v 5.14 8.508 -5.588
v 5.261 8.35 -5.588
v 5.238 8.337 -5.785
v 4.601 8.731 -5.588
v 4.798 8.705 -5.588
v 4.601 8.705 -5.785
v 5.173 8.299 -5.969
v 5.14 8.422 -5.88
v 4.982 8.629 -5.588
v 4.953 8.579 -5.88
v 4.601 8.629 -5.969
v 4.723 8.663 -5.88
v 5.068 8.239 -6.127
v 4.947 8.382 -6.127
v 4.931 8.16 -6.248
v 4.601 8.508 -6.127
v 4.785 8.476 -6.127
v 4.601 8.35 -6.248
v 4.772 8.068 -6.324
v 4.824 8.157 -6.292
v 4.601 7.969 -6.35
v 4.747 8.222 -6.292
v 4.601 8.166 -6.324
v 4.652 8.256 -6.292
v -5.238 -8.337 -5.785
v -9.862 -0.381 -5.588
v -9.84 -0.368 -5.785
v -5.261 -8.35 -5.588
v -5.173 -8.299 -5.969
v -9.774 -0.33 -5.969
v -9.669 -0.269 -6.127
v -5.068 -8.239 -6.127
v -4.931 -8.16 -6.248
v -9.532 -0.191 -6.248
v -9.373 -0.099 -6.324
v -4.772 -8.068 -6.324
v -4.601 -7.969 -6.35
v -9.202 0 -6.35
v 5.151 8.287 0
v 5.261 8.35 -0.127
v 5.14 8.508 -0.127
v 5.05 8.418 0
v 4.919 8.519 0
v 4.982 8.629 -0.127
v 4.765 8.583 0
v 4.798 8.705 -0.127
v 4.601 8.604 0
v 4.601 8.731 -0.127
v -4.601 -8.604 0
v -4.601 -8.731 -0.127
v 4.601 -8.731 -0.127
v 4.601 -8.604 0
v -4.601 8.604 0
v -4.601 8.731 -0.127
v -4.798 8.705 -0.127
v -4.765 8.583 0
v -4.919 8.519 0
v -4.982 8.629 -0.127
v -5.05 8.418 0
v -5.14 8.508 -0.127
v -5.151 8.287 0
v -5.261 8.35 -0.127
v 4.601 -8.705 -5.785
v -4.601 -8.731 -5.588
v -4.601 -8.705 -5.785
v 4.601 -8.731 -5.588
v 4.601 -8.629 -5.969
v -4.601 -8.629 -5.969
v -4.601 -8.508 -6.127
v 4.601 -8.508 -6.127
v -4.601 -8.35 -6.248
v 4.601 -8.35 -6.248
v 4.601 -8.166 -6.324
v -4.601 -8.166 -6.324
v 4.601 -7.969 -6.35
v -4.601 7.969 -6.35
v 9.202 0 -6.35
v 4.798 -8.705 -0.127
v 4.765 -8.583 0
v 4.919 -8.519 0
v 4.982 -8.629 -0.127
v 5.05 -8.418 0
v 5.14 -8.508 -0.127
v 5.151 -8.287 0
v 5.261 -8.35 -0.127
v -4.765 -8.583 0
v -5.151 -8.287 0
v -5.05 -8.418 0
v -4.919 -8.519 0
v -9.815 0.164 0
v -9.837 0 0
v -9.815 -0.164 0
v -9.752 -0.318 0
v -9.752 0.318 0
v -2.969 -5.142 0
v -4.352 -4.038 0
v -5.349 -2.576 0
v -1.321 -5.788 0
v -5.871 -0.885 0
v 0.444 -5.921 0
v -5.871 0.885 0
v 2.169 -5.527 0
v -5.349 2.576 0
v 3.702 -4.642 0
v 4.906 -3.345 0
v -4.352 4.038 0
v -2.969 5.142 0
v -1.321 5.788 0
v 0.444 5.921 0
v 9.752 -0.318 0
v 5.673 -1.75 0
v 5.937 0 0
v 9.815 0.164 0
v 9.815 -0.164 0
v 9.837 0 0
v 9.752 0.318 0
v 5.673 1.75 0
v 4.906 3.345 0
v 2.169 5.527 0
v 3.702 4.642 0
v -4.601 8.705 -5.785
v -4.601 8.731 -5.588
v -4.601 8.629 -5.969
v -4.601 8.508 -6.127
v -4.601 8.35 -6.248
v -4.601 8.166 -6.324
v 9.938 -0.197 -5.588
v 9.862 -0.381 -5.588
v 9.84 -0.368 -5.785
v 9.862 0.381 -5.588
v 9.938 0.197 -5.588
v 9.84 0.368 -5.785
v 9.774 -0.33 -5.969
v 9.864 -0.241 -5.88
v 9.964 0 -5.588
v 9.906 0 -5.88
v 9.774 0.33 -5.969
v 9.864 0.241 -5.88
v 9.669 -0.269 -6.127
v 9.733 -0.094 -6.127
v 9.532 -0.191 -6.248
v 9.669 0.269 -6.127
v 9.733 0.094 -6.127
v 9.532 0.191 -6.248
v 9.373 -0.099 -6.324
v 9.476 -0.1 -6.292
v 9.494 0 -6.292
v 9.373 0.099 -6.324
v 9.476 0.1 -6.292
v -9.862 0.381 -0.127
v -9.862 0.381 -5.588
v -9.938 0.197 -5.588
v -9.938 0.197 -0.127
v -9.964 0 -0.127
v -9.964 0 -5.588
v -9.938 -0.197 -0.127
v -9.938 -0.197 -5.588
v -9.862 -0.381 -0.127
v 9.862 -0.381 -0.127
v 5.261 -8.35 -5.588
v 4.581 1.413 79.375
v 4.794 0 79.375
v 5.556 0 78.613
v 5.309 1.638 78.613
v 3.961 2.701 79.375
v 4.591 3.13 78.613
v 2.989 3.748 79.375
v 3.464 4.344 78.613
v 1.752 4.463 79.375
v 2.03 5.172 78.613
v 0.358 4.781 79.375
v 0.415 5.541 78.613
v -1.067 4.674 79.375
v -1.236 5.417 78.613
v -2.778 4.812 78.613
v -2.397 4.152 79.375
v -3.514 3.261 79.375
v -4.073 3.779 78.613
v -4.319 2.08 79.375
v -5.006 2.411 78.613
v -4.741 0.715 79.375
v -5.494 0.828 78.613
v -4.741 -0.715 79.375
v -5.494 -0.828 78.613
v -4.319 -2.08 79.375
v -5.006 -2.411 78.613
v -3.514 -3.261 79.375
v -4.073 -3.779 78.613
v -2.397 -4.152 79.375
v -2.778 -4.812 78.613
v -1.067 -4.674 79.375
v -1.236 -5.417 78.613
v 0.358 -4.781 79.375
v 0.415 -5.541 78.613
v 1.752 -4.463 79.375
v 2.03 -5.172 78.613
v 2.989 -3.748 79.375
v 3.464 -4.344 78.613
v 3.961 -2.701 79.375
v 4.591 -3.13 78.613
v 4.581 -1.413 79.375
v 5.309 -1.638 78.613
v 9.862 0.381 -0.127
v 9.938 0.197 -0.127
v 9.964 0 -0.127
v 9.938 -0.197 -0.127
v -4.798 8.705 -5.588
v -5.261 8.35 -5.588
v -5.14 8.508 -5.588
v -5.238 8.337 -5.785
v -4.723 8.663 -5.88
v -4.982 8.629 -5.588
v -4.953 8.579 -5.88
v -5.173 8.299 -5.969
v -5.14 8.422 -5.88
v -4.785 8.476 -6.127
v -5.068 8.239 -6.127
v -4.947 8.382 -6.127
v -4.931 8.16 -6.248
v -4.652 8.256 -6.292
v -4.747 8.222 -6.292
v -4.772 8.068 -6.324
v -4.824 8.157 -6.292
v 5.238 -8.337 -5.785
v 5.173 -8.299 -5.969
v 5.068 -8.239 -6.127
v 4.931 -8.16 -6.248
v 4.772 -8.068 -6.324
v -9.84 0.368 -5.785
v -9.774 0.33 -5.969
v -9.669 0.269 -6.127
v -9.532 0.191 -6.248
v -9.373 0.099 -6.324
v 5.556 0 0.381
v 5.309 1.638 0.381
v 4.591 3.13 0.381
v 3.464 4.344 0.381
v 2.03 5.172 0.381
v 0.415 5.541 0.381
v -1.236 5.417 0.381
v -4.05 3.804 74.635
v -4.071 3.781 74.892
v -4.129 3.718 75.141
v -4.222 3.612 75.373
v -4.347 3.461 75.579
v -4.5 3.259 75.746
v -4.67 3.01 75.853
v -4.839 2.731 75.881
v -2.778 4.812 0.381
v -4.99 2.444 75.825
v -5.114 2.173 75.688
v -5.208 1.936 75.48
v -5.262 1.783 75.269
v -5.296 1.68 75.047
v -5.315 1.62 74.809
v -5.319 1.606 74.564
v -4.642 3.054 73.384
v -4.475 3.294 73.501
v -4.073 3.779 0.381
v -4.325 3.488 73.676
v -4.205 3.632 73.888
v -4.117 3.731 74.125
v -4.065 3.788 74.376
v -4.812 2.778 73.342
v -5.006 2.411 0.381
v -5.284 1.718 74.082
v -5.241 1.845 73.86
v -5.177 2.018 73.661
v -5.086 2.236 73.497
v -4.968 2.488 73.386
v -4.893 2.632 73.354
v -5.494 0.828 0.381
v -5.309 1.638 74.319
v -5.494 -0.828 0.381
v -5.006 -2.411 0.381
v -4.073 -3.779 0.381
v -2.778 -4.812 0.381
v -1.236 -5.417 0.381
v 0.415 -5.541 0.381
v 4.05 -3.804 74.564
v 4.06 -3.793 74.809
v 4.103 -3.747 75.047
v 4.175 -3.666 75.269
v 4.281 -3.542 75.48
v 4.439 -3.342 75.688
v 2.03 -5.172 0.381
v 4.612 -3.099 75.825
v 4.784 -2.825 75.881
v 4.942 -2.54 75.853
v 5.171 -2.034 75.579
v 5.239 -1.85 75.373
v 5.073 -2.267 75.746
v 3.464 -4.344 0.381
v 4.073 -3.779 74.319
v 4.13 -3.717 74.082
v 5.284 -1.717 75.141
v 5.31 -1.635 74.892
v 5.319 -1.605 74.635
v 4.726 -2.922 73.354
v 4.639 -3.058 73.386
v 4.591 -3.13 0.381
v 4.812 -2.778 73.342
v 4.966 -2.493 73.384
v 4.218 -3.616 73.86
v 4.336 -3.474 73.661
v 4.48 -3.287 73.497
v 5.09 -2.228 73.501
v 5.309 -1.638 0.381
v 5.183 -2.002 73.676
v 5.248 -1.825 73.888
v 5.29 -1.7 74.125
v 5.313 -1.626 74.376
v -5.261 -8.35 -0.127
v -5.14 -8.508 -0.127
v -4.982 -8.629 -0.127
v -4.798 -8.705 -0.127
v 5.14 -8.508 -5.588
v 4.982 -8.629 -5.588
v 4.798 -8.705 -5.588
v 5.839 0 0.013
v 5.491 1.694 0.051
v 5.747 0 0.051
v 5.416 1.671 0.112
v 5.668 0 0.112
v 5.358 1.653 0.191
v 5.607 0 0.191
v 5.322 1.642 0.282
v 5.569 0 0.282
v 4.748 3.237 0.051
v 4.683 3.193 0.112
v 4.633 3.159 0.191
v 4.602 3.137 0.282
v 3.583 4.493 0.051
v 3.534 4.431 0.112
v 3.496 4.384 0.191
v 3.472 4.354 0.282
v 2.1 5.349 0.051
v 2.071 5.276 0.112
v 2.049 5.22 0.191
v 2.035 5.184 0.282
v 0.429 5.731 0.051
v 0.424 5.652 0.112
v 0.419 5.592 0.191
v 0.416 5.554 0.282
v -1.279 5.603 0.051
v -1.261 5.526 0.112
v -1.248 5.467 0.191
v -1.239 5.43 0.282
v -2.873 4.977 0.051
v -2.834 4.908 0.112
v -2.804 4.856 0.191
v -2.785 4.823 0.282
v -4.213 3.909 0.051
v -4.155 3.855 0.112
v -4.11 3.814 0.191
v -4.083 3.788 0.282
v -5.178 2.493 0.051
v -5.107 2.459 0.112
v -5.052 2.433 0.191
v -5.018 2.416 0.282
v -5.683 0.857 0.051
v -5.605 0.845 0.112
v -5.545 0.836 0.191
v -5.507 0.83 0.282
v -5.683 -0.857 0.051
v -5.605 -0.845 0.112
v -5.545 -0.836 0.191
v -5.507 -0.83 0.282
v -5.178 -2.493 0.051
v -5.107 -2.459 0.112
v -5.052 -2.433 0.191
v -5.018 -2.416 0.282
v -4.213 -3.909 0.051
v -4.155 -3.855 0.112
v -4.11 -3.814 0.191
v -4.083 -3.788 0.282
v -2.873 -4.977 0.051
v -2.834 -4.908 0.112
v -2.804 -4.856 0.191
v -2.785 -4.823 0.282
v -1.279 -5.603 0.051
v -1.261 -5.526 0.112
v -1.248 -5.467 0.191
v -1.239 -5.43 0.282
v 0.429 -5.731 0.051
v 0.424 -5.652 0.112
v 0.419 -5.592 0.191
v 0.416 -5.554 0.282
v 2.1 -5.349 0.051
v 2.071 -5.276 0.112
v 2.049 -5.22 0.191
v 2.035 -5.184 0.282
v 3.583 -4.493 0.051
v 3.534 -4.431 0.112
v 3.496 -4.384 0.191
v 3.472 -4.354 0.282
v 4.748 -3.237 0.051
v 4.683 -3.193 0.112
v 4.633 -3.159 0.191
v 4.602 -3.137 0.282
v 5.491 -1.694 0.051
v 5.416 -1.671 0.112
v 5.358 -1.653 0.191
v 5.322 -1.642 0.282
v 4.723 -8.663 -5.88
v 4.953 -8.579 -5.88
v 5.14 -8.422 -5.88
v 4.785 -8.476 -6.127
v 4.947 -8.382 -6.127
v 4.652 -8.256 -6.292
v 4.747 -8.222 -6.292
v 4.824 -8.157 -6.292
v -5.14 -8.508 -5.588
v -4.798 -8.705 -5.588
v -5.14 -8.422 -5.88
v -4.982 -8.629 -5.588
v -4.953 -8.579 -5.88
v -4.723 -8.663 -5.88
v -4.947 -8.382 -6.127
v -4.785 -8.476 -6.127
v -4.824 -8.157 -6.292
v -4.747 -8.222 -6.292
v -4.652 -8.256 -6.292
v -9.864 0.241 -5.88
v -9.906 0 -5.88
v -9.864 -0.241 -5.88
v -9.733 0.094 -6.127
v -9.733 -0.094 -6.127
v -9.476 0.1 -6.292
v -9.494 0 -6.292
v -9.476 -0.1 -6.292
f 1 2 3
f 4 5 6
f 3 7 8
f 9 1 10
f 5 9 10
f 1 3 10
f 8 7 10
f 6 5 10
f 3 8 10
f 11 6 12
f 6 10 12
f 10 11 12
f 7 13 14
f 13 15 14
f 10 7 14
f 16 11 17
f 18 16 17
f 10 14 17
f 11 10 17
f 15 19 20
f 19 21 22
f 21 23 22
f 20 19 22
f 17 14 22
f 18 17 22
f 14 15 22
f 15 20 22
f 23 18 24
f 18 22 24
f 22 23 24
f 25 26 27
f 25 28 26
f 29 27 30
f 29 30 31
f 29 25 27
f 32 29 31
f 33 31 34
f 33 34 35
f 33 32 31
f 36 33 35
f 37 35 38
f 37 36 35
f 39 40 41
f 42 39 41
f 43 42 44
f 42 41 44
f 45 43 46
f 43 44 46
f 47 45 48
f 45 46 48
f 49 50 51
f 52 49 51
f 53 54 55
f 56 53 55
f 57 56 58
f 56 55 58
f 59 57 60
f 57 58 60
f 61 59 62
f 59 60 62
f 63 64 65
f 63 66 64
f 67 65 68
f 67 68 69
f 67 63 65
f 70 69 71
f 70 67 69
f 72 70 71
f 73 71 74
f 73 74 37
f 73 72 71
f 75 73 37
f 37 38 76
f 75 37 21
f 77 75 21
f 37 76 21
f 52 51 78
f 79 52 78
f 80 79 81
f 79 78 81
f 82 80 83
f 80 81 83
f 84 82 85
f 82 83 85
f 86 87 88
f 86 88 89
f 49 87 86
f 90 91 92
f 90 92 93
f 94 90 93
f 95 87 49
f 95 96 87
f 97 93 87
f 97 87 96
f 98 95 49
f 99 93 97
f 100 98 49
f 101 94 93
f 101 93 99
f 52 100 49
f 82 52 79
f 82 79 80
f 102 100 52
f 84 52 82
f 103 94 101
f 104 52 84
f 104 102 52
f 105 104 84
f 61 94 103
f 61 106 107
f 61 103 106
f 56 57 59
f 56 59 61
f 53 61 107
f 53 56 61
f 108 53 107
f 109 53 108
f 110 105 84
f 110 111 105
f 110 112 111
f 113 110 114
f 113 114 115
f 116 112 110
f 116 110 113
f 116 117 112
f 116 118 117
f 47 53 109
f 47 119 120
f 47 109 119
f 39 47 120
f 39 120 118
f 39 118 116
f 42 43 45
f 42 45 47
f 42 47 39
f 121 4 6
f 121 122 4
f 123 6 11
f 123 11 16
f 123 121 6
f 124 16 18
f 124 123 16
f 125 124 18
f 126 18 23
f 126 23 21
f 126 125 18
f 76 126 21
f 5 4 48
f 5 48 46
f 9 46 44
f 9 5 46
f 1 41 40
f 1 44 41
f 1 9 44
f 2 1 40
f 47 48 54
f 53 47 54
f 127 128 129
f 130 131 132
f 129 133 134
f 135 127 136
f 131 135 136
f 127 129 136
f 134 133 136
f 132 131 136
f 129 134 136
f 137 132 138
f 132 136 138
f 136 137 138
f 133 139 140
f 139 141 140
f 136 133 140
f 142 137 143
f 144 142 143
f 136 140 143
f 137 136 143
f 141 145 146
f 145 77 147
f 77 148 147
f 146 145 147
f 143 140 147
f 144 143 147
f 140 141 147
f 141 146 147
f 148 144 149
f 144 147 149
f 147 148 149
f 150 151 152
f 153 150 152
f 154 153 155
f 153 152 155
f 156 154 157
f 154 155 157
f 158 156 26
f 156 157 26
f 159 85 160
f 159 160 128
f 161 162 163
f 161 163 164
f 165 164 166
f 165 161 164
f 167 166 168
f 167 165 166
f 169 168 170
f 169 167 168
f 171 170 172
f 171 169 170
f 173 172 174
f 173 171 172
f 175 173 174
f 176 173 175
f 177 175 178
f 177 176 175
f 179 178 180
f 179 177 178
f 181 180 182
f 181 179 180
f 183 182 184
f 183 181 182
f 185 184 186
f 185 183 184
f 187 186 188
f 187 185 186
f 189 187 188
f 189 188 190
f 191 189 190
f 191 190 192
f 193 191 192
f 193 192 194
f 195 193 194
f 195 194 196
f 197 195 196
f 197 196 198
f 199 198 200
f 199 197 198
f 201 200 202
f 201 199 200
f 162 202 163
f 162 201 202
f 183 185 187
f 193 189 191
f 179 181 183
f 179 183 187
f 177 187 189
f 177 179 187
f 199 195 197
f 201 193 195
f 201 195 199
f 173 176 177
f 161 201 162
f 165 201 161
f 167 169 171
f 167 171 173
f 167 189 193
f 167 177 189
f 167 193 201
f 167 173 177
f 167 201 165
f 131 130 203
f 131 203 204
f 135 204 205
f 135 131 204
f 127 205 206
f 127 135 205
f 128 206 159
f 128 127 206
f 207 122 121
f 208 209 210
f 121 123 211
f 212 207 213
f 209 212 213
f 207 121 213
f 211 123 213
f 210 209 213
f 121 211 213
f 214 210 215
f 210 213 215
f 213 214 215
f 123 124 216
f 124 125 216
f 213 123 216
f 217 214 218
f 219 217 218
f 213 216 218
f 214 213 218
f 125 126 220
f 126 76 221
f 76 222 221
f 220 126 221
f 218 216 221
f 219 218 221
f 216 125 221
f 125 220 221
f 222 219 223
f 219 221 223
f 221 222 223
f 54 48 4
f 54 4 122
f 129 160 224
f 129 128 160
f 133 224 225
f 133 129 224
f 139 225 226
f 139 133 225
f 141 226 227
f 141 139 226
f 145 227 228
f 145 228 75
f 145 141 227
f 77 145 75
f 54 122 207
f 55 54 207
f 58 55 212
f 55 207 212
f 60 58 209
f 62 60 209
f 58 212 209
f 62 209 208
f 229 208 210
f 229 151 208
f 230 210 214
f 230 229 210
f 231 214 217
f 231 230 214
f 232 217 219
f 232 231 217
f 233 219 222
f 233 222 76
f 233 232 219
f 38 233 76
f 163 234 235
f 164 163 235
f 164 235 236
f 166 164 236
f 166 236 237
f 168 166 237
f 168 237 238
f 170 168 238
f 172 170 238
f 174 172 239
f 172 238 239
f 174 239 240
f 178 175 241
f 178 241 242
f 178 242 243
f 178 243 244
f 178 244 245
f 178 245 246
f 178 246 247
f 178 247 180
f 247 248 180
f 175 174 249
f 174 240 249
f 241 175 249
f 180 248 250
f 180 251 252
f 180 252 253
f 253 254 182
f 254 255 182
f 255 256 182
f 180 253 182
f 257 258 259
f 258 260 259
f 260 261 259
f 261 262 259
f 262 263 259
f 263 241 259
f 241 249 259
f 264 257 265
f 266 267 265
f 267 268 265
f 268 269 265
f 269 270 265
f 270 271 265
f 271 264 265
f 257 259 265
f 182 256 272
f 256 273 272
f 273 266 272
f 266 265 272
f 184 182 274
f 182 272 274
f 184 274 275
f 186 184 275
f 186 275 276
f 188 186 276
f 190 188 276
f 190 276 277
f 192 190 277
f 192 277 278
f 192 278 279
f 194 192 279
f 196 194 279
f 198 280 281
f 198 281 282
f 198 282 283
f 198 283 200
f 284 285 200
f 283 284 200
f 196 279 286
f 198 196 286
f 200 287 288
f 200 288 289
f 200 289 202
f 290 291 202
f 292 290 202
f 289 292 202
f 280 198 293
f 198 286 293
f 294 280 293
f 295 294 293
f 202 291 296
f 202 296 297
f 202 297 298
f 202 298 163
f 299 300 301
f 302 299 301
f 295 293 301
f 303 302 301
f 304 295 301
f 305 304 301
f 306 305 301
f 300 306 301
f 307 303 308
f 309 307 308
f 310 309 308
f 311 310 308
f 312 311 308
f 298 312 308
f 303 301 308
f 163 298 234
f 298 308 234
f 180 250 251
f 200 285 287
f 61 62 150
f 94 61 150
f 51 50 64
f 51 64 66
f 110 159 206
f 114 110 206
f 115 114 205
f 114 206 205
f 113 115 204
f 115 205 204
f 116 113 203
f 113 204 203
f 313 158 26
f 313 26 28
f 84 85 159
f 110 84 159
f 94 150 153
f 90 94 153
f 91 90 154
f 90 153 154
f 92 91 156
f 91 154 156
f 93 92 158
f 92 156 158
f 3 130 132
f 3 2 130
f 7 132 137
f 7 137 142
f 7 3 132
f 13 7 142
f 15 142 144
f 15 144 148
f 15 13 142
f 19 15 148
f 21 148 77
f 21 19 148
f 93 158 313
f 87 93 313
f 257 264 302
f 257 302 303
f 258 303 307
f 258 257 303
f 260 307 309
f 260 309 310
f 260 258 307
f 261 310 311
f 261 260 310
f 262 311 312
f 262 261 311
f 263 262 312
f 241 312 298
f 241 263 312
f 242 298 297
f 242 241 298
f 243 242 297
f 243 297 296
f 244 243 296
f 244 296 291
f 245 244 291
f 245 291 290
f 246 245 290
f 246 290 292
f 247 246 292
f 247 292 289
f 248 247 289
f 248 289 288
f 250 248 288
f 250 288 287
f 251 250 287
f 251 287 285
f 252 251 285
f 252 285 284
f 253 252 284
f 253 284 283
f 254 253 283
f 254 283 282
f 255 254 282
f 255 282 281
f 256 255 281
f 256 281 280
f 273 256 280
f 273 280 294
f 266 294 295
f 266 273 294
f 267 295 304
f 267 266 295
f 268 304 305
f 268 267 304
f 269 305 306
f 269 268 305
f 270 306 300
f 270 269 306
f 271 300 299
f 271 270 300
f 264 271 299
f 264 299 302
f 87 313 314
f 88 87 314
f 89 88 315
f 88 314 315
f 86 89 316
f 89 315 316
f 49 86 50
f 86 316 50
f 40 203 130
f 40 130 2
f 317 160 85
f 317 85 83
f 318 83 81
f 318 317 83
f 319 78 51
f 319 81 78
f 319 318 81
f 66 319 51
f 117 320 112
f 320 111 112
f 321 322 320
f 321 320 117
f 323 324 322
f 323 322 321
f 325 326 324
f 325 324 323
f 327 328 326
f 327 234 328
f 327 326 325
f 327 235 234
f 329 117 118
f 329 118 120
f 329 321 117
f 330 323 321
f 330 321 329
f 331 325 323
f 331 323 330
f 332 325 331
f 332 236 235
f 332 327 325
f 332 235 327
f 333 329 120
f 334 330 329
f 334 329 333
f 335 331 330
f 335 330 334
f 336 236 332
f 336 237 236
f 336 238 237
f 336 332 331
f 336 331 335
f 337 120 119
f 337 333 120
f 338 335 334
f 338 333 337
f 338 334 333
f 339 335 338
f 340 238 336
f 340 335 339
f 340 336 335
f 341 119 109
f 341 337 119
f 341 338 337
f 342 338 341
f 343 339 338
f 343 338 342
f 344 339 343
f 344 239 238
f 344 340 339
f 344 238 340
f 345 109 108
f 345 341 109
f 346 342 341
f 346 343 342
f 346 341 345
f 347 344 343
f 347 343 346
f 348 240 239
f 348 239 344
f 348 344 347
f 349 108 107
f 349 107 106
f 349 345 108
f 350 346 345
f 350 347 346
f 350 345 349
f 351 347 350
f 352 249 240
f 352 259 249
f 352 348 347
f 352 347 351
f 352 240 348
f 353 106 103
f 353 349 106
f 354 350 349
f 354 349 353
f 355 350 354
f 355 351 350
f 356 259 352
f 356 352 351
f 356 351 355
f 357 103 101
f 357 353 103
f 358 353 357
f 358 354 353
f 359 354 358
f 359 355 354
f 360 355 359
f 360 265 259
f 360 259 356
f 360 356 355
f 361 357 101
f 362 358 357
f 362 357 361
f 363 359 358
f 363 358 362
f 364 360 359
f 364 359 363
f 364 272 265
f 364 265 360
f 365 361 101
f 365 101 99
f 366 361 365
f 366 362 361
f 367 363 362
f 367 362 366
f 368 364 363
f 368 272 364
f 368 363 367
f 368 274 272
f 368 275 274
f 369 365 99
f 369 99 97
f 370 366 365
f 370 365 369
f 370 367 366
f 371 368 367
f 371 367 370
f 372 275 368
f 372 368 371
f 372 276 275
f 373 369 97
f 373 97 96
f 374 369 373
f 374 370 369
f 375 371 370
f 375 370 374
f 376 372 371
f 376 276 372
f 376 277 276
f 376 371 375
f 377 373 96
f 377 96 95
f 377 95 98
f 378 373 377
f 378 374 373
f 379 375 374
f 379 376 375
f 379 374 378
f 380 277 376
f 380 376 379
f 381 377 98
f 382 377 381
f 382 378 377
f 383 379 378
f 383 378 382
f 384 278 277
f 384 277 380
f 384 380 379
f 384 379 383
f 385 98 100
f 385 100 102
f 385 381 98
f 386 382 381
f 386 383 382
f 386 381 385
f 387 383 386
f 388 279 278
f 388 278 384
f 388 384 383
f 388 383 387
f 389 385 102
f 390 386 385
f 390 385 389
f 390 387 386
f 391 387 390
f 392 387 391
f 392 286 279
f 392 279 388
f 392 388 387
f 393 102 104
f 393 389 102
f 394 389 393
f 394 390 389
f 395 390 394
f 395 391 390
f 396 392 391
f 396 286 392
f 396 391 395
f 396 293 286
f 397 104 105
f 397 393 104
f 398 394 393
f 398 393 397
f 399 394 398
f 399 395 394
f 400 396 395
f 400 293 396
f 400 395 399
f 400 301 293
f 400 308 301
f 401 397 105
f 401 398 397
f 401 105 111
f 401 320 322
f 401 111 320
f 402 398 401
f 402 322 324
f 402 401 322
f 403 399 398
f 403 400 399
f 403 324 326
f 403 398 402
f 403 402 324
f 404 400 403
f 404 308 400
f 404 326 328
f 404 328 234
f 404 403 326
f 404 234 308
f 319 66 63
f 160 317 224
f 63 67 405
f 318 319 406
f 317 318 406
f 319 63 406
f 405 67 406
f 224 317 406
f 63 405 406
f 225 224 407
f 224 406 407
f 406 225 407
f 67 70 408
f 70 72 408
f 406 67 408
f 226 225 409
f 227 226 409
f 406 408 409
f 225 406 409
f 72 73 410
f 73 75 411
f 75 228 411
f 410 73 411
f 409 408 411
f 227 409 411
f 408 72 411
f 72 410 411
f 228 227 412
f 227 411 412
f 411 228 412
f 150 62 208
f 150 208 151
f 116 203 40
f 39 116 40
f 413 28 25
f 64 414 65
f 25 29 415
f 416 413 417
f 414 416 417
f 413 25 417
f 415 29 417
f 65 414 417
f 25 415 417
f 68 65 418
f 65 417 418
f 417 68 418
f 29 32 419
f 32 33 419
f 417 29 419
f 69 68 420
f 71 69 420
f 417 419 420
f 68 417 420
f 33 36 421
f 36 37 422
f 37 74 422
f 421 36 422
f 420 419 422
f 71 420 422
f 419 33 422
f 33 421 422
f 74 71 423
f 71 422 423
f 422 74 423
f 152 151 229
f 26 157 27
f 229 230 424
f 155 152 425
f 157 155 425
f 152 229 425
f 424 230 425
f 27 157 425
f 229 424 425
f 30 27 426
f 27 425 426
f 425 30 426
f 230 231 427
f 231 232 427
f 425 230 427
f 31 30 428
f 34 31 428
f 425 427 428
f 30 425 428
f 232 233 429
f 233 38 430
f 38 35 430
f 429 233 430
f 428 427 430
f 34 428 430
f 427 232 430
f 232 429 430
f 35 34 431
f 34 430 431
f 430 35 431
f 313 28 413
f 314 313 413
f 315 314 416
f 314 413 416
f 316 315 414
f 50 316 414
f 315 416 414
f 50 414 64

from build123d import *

# Parameters (mm, degrees)
SHANK_DIAMETER_R      = 5.55625
SHANK_DEPTH           = 79.375
HEAD_DEPTH            = 6.35
SKETCH1_R             = 1.27
SHANK_HOLE_DEPTH      = 22.828125
SHANK_HOLE_DEPTH_BACK = 5.365625
FILLET1_R             = 0.762
FILLET2_R             = 0.762
CHAMFER1_SIZE         = 0.762
CHAMFER2_SIZE         = 0.127
FILLET4_R             = 0.381


with BuildPart() as part:
    # Shank_Diameter → Shank (new body)
    with BuildSketch(Plane.XY):
        Circle(SHANK_DIAMETER_R)
    extrude(amount=SHANK_DEPTH)

    # Hex 2 → Head (add)
    with BuildSketch(Plane(origin=(0, 0, 0), x_dir=(-1, 0, 0), z_dir=(0, 0, -1))):
        Polygon((-5.040989538, 8.73125), (5.040989538, 8.73125), (10.081979076, 0), (5.040989538, -8.73125), (-5.040989538, -8.73125), (-10.081979076, 0), align=None)
    extrude(amount=HEAD_DEPTH)

    # Sketch1 → Shank_Hole (cut, two sides)
    with BuildSketch(Plane(origin=(-8.305880657, 3.0762927, 0), x_dir=(0, 0, -1), z_dir=(0.866025404, -0.5, 0))) as shank_hole_sk:
        with Locations((-74.6125, 1.4887927)):
            Circle(SKETCH1_R)
    extrude(amount=SHANK_HOLE_DEPTH, mode=Mode.SUBTRACT)
    extrude(shank_hole_sk.sketch, amount=-SHANK_HOLE_DEPTH_BACK, mode=Mode.SUBTRACT)

    # Fillet1
    fillet1_edges = [part.edges().sort_by_distance(p)[0] for p in [
        (5.040989538, 8.73125, -3.175),
        (10.081979076, 0, -3.175),
        (5.040989538, -8.73125, -3.175),
        (-5.040989538, -8.73125, -3.175),
        (-10.081979076, 0, -3.175),
        (-5.040989538, 8.73125, -3.175),
    ]]
    fillet(fillet1_edges, radius=FILLET1_R)

    # Fillet2
    fillet2_edges = [part.edges().sort_by_distance(p)[0] for p in [
        (0, 8.73125, -6.35),
        (-7.561484307, 4.365625, -6.35),
        (7.561484307, 4.365625, -6.35),
        (7.561484307, -4.365625, -6.35),
        (0, -8.73125, -6.35),
        (-7.561484307, -4.365625, -6.35),
    ]]
    fillet(fillet2_edges, radius=FILLET2_R)

    # Chamfer1
    chamfer1_edges = [part.edges().sort_by_distance(p)[0] for p in [
        (-5.55625, 0, 79.375),
    ]]
    chamfer(chamfer1_edges, length=CHAMFER1_SIZE)

    # Chamfer2
    chamfer2_edges = [part.edges().sort_by_distance(p)[0] for p in [
        (0, 8.73125, 0),
        (7.561484307, 4.365625, 0),
        (-7.561484307, 4.365625, 0),
        (-7.561484307, -4.365625, 0),
        (0, -8.73125, 0),
        (7.561484307, -4.365625, 0),
        (-4.982048633, -8.629161358, 0),
        (4.982048633, -8.629161358, 0),
        (-9.964097265, 0, 0),
        (9.964097265, 0, 0),
        (4.982048633, 8.629161358, 0),
        (-4.982048633, 8.629161358, 0),
    ]]
    chamfer(chamfer2_edges, length=CHAMFER2_SIZE)

    # Fillet4
    fillet4_edges = [part.edges().sort_by_distance(p)[0] for p in [
        (-5.55625, 0, 0),
    ]]
    fillet(fillet4_edges, radius=FILLET4_R)


solid = part.part
